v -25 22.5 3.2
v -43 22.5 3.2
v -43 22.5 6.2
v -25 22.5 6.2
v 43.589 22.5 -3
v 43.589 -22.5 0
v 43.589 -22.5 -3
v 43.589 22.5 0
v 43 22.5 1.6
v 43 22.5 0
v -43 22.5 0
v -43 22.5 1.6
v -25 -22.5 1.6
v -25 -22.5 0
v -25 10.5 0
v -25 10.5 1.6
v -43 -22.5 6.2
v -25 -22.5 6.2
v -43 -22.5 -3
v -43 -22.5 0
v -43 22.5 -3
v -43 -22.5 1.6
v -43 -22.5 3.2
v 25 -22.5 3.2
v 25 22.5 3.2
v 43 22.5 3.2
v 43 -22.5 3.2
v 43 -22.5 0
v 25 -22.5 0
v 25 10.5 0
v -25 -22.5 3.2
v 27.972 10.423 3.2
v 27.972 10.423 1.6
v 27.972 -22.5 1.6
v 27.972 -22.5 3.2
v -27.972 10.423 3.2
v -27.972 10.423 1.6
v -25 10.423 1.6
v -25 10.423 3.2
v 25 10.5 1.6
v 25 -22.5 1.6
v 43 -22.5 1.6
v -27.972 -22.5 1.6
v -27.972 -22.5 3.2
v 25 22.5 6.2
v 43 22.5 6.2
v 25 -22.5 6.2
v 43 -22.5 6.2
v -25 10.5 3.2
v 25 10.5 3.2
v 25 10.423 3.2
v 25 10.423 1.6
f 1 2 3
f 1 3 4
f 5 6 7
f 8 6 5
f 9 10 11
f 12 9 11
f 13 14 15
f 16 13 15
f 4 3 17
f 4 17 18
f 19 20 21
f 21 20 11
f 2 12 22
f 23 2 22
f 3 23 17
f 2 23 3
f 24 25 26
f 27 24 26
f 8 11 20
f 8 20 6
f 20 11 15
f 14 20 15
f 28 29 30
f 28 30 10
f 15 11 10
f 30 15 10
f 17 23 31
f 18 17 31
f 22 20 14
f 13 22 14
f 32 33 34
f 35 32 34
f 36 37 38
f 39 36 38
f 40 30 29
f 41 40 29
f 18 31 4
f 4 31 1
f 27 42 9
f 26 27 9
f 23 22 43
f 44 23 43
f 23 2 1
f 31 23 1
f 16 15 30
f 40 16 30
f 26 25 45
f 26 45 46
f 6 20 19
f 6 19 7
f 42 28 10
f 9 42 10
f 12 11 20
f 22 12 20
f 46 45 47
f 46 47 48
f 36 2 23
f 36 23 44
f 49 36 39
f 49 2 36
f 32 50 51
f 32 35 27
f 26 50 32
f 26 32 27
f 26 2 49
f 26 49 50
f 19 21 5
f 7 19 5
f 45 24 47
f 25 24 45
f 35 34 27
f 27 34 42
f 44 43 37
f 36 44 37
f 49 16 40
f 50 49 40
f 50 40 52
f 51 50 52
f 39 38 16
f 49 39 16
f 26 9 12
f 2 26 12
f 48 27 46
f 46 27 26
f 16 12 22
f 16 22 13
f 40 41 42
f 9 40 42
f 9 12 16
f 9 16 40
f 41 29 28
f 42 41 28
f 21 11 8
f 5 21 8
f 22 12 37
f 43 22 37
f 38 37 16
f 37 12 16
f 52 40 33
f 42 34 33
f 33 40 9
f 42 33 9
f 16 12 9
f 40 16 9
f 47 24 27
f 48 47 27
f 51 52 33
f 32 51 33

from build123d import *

# Parameters (mm, degrees)
F1_DEPTH = 1.6
F3_DEPTH = 1.6
F4_W     = 18
F4_H     = 45
F5_DEPTH = 3
F6_W     = 86.589366
F6_H     = 45
F7_DEPTH = 3


with BuildPart() as f1:
    # F0 (on Top) → F1 (new body)
    with BuildSketch(Plane.XY):
        Polygon((43, -22.5), (43, 22.5), (-43, 22.5), (-43, -22.5), (-25, -22.5), (-25, 10.5), (25, 10.5), (25, -22.5), align=None)
    extrude(amount=F1_DEPTH)


with BuildPart() as f3:
    # F2 (on face) → F3 (new body)
    with BuildSketch(Plane.XY.offset(1.6)):
        Polygon((43, -22.5), (43, 22.5), (-43, 22.5), (-43, -22.5), (-27.972288, -22.5), (-27.972288, 10.422795), (-25, 10.422795), (-25, 10.5), (25, 10.5), (25, 10.422795), (27.972288, 10.422795), (27.972288, -22.5), align=None)
    extrude(amount=F3_DEPTH)


with BuildPart() as f5:
    # F4 (on face) → F5 (new body)
    with BuildSketch(Plane.XY.offset(3.2)):
        with Locations((-34, 0)):
            Rectangle(F4_W, F4_H)
        with Locations((34, 0)):
            Rectangle(F4_W, F4_H)
    extrude(amount=F5_DEPTH)


with BuildPart() as f7:
    # F6 (on Top) → F7 (new body)
    with BuildSketch(Plane.XY):
        with Locations((0.294683, 0)):
            Rectangle(F6_W, F6_H)
    extrude(amount=-F7_DEPTH)


solid = Compound([f1.part, f3.part, f5.part, f7.part])
